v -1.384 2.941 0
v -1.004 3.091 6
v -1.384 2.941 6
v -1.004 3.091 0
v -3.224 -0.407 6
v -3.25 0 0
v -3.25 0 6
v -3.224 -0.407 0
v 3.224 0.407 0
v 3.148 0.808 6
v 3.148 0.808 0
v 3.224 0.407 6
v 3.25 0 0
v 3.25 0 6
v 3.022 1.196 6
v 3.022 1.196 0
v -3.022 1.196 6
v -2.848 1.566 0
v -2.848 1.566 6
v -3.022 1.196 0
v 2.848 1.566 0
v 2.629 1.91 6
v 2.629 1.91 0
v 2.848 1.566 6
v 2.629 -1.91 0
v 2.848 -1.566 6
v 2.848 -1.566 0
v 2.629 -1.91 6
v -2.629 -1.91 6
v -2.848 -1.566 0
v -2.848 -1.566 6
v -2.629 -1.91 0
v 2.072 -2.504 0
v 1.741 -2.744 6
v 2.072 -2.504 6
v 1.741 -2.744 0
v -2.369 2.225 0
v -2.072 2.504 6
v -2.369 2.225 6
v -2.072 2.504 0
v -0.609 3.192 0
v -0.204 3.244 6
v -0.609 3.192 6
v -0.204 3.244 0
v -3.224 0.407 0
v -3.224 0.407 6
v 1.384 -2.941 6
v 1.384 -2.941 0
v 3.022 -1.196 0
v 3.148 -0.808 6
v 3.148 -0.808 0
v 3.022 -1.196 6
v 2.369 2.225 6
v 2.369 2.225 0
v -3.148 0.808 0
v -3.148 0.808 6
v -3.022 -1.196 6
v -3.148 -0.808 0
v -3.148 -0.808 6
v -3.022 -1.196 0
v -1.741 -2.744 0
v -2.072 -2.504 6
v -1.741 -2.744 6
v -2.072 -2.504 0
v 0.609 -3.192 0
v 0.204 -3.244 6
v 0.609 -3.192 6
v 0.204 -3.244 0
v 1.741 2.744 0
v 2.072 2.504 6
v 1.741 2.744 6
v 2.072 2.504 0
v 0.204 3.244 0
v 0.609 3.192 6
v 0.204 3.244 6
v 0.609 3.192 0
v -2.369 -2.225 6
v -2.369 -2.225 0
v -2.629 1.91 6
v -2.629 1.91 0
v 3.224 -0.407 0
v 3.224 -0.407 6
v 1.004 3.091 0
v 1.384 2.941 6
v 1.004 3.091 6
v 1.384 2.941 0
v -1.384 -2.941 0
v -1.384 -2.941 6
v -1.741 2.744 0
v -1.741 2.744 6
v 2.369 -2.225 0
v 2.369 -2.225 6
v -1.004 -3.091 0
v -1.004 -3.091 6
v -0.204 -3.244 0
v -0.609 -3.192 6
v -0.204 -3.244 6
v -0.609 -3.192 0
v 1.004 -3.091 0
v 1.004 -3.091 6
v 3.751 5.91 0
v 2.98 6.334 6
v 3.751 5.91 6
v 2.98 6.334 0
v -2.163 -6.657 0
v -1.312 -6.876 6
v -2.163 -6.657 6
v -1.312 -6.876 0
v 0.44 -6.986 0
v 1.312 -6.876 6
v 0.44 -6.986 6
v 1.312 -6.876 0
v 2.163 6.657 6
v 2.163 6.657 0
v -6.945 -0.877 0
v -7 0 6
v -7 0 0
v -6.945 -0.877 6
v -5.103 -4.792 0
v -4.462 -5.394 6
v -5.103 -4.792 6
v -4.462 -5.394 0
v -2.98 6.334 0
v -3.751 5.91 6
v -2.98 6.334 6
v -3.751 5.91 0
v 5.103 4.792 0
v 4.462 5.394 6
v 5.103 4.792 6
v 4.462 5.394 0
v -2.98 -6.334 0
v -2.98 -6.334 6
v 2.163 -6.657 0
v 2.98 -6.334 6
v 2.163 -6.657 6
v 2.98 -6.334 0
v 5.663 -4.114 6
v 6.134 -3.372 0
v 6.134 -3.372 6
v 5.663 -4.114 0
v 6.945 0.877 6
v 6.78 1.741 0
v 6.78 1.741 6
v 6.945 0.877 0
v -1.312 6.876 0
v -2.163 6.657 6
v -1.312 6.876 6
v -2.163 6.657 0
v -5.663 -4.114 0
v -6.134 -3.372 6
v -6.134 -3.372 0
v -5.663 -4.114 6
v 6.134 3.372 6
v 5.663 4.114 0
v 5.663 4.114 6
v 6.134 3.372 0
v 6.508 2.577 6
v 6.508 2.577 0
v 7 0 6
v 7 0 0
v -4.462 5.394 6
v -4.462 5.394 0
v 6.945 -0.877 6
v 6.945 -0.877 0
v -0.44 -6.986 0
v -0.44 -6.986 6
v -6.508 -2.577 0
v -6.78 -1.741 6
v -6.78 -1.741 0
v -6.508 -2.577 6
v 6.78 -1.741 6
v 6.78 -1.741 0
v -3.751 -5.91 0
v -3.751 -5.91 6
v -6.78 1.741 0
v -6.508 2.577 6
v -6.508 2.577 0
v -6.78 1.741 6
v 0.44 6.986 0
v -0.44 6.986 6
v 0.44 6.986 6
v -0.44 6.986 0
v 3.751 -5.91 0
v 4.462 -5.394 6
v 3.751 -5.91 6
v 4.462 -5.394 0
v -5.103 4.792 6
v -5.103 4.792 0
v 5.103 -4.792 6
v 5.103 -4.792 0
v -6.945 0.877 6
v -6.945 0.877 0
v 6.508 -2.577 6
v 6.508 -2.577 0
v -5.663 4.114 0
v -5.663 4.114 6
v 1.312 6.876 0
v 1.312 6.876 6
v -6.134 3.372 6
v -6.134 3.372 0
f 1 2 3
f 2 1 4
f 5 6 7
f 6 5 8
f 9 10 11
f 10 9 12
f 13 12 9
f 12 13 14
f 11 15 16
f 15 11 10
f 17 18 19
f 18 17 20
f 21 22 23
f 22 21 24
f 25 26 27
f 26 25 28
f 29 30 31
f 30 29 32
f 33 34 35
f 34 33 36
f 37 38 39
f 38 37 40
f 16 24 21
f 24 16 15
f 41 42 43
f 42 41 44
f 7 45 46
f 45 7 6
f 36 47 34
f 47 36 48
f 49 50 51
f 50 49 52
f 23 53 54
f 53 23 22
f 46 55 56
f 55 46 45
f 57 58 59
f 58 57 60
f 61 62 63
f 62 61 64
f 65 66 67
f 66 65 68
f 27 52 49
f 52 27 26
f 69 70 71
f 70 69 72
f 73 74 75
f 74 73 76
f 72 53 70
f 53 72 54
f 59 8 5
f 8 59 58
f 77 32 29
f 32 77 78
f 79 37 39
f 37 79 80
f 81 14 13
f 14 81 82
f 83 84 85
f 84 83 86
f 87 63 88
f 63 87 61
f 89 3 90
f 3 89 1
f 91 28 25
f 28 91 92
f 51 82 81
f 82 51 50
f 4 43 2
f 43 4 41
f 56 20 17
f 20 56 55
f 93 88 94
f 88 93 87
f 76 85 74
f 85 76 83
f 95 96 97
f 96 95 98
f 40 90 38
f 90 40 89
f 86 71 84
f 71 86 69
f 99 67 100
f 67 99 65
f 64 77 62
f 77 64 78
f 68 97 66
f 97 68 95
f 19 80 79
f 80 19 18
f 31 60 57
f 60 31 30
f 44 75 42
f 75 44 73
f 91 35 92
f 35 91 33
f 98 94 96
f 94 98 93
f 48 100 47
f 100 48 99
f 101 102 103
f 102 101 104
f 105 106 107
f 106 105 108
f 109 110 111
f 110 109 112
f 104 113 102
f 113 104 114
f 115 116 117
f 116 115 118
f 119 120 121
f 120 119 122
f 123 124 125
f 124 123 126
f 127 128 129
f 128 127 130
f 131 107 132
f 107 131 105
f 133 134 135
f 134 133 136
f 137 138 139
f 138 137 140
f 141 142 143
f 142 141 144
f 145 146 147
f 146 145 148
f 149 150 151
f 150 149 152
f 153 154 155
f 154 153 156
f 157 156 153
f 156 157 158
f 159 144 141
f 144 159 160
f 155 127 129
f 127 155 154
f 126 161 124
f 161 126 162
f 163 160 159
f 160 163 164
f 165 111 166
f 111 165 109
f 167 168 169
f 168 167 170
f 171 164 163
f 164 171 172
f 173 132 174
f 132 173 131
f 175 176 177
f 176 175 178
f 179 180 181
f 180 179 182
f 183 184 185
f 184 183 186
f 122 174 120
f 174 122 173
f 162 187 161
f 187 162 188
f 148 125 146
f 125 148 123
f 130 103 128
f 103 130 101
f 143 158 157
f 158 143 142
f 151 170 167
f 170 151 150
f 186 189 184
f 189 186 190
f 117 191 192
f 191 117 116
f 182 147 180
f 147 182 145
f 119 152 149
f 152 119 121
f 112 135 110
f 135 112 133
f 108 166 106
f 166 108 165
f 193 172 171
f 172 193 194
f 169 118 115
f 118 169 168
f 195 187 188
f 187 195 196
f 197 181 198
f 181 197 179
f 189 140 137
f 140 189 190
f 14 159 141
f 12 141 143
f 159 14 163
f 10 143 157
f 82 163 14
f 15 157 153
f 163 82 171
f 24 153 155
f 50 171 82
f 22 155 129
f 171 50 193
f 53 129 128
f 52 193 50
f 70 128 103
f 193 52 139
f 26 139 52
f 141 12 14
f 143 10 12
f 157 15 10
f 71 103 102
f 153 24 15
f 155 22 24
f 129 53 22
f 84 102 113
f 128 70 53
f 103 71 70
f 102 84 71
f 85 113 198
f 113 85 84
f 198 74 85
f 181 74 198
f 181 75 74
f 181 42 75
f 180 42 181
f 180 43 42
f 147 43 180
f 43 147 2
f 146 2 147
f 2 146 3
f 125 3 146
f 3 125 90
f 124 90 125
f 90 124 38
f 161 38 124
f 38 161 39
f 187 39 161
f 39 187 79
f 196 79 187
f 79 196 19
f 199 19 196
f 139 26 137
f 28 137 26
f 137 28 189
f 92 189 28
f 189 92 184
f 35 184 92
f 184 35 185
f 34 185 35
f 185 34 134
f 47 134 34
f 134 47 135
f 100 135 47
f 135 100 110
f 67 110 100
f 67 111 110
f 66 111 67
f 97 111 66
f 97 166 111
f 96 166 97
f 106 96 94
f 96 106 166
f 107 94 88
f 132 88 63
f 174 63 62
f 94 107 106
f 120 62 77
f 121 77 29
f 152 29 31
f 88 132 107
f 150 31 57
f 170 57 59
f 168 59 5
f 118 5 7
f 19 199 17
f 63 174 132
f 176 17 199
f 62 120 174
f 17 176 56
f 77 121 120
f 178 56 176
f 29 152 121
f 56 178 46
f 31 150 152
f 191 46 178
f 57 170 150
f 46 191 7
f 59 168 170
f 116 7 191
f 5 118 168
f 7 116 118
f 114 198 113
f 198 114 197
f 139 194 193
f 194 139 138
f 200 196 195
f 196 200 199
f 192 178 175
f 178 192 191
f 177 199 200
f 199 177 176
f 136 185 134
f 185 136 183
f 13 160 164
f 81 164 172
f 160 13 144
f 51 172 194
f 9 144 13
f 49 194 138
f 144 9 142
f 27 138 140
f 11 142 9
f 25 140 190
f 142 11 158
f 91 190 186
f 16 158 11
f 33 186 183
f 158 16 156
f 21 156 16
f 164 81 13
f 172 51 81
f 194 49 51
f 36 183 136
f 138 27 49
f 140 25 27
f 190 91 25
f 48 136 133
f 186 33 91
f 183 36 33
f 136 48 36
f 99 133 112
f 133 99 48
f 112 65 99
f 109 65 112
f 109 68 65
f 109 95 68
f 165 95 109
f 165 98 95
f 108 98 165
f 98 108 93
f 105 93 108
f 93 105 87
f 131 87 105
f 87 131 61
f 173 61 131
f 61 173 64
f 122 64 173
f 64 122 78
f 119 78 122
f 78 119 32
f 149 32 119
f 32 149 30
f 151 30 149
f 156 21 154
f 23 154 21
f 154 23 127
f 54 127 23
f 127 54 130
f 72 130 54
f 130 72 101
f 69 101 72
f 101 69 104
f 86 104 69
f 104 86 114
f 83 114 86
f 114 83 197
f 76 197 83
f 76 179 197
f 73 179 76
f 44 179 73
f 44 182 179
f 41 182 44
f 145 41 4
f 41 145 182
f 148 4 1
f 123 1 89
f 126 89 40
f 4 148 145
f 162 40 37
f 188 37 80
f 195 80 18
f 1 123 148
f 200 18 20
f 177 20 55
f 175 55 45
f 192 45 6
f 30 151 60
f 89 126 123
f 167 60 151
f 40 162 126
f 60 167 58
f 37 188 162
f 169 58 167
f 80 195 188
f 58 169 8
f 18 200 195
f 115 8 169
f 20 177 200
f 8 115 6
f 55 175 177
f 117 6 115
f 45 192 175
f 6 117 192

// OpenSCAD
$fn = 50;


difference() {
	union() {
		cylinder(h = 6, r = 7.0000000000);
	}
	union() {
		translate(v = [0, 0, -100]) {
			cylinder(h = 200, r = 3.2500000000);
		}
		translate(v = [0, 0, -100]) {
			cylinder(h = 200, r = 1.8000000000);
		}
	}
}
